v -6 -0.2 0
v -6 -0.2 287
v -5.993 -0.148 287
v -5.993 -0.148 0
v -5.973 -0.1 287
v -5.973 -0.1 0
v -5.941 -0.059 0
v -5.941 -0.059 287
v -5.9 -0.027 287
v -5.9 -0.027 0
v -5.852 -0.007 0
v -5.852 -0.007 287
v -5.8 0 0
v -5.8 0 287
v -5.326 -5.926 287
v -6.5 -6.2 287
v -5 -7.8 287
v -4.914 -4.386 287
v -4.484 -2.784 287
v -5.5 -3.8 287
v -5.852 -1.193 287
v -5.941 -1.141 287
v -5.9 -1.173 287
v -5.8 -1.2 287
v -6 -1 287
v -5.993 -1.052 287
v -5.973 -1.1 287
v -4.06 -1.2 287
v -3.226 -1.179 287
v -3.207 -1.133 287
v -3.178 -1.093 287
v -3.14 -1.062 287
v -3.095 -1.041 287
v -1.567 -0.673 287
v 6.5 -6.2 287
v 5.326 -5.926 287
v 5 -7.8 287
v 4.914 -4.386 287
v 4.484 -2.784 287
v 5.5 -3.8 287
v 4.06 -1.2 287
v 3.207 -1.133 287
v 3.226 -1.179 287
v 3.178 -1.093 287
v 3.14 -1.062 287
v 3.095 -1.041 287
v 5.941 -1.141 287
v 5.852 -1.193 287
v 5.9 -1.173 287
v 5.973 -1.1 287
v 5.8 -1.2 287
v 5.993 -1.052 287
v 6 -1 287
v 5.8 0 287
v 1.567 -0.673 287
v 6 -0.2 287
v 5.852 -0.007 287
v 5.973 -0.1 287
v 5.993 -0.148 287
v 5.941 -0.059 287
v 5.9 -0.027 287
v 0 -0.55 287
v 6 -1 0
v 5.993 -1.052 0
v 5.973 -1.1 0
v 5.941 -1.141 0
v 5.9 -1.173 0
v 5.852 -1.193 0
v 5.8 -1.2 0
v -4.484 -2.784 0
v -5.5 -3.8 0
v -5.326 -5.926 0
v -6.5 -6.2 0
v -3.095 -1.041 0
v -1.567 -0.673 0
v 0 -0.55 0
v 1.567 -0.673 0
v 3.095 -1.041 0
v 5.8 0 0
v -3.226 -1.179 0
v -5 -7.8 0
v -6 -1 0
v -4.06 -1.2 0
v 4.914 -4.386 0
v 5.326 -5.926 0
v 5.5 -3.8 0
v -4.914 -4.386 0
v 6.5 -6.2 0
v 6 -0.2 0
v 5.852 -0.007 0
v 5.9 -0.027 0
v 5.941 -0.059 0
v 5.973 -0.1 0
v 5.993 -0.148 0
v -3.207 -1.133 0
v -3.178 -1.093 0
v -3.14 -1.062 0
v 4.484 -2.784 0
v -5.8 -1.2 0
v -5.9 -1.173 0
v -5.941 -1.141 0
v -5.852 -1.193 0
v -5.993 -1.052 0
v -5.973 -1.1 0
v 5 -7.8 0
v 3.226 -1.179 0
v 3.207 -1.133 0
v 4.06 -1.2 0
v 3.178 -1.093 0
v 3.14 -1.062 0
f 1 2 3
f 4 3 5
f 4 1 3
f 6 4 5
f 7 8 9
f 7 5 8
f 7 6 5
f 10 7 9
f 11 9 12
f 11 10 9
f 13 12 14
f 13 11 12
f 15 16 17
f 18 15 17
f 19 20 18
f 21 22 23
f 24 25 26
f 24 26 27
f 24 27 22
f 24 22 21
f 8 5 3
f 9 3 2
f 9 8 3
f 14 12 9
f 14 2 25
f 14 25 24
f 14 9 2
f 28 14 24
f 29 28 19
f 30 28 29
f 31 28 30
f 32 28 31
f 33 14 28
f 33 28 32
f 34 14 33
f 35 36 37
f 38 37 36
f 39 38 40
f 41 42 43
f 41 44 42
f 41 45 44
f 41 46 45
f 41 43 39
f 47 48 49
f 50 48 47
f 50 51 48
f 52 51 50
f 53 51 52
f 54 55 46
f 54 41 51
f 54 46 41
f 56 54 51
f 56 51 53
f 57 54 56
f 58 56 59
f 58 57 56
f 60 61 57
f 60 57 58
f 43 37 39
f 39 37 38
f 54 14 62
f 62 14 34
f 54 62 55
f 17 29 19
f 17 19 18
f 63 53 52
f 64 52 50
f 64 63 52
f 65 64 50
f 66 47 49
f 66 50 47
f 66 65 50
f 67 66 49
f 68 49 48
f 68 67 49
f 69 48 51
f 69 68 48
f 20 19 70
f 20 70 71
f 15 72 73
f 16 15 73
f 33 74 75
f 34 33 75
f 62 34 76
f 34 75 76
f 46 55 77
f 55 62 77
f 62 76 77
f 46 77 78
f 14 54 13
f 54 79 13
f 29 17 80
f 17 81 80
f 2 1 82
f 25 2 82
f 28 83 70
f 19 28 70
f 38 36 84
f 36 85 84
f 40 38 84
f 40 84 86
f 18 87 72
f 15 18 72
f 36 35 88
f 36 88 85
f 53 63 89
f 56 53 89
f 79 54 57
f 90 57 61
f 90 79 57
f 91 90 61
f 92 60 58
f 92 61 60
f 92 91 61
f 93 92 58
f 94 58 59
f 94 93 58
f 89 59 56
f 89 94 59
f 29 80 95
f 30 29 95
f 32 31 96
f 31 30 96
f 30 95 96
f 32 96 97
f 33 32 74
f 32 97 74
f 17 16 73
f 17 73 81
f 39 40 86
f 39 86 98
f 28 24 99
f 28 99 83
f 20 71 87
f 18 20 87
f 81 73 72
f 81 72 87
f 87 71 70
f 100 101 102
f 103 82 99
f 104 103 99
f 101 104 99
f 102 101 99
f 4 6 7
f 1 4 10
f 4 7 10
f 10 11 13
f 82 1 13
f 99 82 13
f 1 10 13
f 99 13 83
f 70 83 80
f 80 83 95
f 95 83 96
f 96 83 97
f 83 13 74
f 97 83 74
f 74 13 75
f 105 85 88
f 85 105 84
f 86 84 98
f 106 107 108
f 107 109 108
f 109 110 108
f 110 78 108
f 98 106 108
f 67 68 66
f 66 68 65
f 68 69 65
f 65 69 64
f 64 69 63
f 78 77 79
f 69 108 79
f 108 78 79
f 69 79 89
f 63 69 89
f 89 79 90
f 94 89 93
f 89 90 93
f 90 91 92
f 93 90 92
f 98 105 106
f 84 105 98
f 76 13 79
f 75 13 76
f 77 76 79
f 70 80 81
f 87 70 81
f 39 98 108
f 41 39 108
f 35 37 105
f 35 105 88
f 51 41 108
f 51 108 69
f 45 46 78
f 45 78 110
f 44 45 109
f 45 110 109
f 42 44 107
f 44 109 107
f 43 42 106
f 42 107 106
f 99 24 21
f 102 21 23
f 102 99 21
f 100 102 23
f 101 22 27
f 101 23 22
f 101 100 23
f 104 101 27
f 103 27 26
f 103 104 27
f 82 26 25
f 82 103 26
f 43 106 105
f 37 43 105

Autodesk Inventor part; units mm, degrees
sketch "Sketch_1" plane through (0, 0, 0) normal (0, 0, 1) x (1, 0, 0)
  line L0 (-6.5, -6.2) -> (-5, -7.8)
  line L1 (-5, -7.8) -> (-3.226, -1.1793)
  arc A0 (-3.0947, -1.0409) -> (-3.226, -1.1793) centre (-3.0328, -1.2311) ccw
  arc A1 (3.0947, -1.0409) -> (-3.0947, -1.0409) centre (0, -10.55) ccw
  arc A2 (3.226, -1.1793) -> (3.0947, -1.0409) centre (3.0328, -1.2311) ccw
  line L2 (3.226, -1.1793) -> (5, -7.8)
  line L3 (5, -7.8) -> (6.5, -6.2)
  line L4 (6.5, -6.2) -> (5.326, -5.9257)
  line L5 (5.326, -5.9257) -> (4.9136, -4.3864)
  line L6 (4.9136, -4.3864) -> (5.5, -3.8)
  line L7 (5.5, -3.8) -> (4.4843, -2.7843)
  line L8 (4.4843, -2.7843) -> (4.0598, -1.2)
  line L9 (4.0598, -1.2) -> (5.8, -1.2)
  arc A3 (5.8, -1.2) -> (6, -1) centre (5.8, -1) ccw
  line L10 (6, -1) -> (6, -0.2)
  arc A4 (6, -0.2) -> (5.8, 0) centre (5.8, -0.2) ccw
  line L11 (5.8, 0) -> (-5.8, 0)
  arc A5 (-5.8, 0) -> (-6, -0.2) centre (-5.8, -0.2) ccw
  line L12 (-6, -0.2) -> (-6, -1)
  arc A6 (-6, -1) -> (-5.8, -1.2) centre (-5.8, -1) ccw
  line L13 (-5.8, -1.2) -> (-4.0598, -1.2)
  line L14 (-4.0598, -1.2) -> (-4.4843, -2.7843)
  line L15 (-4.4843, -2.7843) -> (-5.5, -3.8)
  line L16 (-5.5, -3.8) -> (-4.9136, -4.3864)
  line L17 (-4.9136, -4.3864) -> (-5.326, -5.9257)
  line L18 (-5.326, -5.9257) -> (-6.5, -6.2)
extrude "Extrusion1" add sketch "Sketch_1" along normal blind 287
ref_plane "ABDECKPROFIL_XY" through (0, 0, 287) normal (0, 0, -1) x (1, 0, 0)
ref_plane "ABDECKPROFIL_YZ" through (0, 0, 287) normal (1, 0, 0) x (0, -1, 0)
ref_plane "ABDECKPROFIL_ZX" through (0, 0, 287) normal (0, -1, 0) x (0, 0, -1)
properties part number "SLZ_63_Abdeck_Profil#_2871"
